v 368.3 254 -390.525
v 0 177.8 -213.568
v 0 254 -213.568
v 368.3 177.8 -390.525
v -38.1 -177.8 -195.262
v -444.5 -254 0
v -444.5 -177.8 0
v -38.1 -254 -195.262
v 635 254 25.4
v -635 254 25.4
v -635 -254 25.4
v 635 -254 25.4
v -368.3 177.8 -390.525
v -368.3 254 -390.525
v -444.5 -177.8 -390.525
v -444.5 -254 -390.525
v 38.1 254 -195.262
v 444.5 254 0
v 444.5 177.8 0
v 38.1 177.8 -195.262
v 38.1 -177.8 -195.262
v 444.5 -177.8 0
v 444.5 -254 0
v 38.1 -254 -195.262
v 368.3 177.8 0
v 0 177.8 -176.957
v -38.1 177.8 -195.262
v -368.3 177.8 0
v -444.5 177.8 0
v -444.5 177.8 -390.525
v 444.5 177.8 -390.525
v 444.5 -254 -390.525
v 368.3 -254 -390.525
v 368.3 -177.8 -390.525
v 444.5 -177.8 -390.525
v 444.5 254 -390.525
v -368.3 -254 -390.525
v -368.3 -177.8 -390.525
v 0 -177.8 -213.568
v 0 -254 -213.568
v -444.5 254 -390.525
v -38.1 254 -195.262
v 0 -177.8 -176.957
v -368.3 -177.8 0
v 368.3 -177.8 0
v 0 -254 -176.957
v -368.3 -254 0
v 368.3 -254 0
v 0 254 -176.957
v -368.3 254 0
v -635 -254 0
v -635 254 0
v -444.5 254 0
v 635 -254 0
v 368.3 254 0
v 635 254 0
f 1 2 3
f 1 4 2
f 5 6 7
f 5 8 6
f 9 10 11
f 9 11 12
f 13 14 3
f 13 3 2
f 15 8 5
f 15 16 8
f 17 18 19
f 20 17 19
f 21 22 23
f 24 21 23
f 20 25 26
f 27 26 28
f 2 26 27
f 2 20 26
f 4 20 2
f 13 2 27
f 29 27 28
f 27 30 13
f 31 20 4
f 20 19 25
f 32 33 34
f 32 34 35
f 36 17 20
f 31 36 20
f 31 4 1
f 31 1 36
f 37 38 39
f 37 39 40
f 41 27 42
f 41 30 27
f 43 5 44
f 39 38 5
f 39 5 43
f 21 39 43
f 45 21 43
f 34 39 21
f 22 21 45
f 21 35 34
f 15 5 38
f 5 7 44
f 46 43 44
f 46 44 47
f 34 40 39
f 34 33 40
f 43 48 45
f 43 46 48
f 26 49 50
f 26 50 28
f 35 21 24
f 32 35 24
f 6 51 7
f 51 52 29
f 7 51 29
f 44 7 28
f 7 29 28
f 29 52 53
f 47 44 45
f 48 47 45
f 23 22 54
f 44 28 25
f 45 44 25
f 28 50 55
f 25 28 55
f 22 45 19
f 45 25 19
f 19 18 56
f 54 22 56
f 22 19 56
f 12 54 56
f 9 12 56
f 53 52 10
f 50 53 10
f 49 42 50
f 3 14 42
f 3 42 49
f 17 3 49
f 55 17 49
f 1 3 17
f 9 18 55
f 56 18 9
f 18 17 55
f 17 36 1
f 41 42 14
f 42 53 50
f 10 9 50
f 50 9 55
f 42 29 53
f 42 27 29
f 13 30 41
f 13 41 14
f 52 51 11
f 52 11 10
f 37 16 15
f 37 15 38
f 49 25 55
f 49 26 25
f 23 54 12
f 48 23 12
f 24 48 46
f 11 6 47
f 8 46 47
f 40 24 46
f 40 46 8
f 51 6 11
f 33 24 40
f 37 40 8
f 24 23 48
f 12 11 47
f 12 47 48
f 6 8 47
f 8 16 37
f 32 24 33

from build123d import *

# Parameters (mm, degrees)
F0_W     = 1270
F0_H     = 508
F1_DEPTH = 25.4
F2_W     = 76.2
F2_H     = 76.2
F4_W     = 76.2
F4_H     = 76.2


with BuildPart() as f1:
    # F0 (on Top) → F1 (new body)
    with BuildSketch(Plane.XY):
        Rectangle(F0_W, F0_H)
    extrude(amount=F1_DEPTH)

    # F2 (on face) → F5 section 0
    with BuildSketch(Plane(origin=(0, 0, 0), x_dir=(1, 0, 0), z_dir=(0, 0, -1))):
        with Locations((-406.4, 215.9)):
            Rectangle(F2_W, F2_H)
    # F4 (on offset) → F5 section 1
    with BuildSketch(Plane(origin=(0, 0, -390.525), x_dir=(1, 0, 0), z_dir=(0, 0, -1))):
        with Locations((406.4, 215.9)):
            Rectangle(F4_W, F4_H)
    loft()

    # F2 (on face) → F6 section 0
    with BuildSketch(Plane(origin=(0, 0, 0), x_dir=(1, 0, 0), z_dir=(0, 0, -1))):
        with Locations((-406.4, -215.9)):
            Rectangle(F2_W, F2_H)
    # F4 (on offset) → F6 section 1
    with BuildSketch(Plane(origin=(0, 0, -390.525), x_dir=(1, 0, 0), z_dir=(0, 0, -1))):
        with Locations((406.4, -215.9)):
            Rectangle(F4_W, F4_H)
    loft()

    # F2 (on face) → F7 section 0
    with BuildSketch(Plane(origin=(0, 0, 0), x_dir=(1, 0, 0), z_dir=(0, 0, -1))):
        with Locations((406.4, -215.9)):
            Rectangle(F2_W, F2_H)
    # F4 (on offset) → F7 section 1
    with BuildSketch(Plane(origin=(0, 0, -390.525), x_dir=(1, 0, 0), z_dir=(0, 0, -1))):
        with Locations((-406.4, -215.9)):
            Rectangle(F4_W, F4_H)
    loft()

    # F2 (on face) → F8 section 0
    with BuildSketch(Plane(origin=(0, 0, 0), x_dir=(1, 0, 0), z_dir=(0, 0, -1))):
        with Locations((406.4, 215.9)):
            Rectangle(F2_W, F2_H)
    # F4 (on offset) → F8 section 1
    with BuildSketch(Plane(origin=(0, 0, -390.525), x_dir=(1, 0, 0), z_dir=(0, 0, -1))):
        with Locations((-406.4, 215.9)):
            Rectangle(F4_W, F4_H)
    loft()


solid = f1.part
